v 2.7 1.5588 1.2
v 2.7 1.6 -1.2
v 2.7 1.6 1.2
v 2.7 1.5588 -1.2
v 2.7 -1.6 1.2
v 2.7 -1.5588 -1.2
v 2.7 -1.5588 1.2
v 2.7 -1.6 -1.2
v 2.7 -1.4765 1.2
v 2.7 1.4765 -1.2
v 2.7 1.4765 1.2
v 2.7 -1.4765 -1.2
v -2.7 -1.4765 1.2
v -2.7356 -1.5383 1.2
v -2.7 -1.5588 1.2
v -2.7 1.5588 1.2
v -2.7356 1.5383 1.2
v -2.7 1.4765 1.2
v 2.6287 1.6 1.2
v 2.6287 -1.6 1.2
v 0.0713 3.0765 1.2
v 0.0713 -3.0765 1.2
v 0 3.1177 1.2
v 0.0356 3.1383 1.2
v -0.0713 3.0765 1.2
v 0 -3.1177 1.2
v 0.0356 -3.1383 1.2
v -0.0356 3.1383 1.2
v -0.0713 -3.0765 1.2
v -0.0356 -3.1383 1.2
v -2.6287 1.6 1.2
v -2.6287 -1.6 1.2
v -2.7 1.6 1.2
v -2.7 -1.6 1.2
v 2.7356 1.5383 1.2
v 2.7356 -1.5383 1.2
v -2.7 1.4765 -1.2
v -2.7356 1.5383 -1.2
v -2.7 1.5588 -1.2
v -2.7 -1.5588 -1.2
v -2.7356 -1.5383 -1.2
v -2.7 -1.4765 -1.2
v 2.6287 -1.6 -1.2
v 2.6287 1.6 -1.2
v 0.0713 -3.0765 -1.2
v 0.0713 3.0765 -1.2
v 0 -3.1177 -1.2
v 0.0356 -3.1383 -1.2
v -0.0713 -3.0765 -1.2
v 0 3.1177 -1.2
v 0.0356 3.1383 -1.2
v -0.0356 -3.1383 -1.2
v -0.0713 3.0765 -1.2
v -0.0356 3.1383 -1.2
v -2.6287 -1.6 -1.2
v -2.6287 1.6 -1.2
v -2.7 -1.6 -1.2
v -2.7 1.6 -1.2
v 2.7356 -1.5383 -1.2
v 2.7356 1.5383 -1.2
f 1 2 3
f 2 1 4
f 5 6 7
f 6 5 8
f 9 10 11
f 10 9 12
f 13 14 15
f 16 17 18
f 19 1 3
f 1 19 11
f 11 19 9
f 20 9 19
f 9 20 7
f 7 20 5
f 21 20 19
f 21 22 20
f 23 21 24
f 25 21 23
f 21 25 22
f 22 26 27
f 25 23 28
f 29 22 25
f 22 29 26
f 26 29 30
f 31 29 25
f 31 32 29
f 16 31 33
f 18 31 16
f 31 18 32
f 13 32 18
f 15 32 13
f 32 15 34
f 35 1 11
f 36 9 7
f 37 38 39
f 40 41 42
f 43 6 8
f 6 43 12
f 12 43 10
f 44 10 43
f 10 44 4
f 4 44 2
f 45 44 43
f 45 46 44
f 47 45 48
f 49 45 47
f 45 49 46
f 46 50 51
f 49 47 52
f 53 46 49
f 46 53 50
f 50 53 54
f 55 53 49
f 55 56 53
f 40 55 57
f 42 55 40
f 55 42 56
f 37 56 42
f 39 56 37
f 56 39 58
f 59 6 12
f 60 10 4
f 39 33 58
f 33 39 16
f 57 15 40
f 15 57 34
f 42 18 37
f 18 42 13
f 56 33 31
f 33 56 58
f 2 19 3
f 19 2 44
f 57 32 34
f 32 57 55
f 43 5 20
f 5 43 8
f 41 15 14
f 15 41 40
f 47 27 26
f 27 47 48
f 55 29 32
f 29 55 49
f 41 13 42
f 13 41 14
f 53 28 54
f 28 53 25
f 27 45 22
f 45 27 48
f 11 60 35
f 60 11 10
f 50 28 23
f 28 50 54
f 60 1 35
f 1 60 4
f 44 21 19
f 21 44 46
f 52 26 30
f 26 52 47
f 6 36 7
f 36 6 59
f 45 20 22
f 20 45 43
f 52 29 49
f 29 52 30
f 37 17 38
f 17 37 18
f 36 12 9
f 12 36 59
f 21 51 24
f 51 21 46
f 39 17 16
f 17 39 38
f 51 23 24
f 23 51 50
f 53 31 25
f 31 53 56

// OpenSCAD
// file: variables.scad
innerWidth = 38;
innerLength = 80;
innerHeight = 25;
minEdgeWidth = 2.5;
largeEdgeWidth = 6;
holeRadius = 2;
boxSpacing = 4;
stickRadius = 7.1; // fixed by table

sensorScrewHoleRadius = 2.5/2;

// PCBVariables
	PCBWidth = 35.2;
	PCBBoardLength = 70;
	PCBLength = 80;// 70;
	PCBHeight = 1.5;
	PCBBoardToBoardHeight = 13.9; // height of the two layers of pcb and the pinheaders between them
	
	PCBToBottomSpacing = 3; // space for wires on bottom of PCB
	PCBToTopSpacing = 2; // Air gap between pcb components and stick
	PCBNotchWidth = 1.5; // user definable
	PCBComponentsHeight = 17.1-PCBBoardToBoardHeight; // Height of pCB components on top of top layer pcb

	PCBSensorBoardLength = 15.75;
	PCBSensorBoardWidth = 21;
	PCBSensorBoardOverhang = 7.4; // The length of sensor board that overhangs the main print board
	PCBSensorBoardYOffset = -1.5/2;
	PCBSensorBoardHoleRadius = 1.5;
	PCBSensorBoardHoleCenterYDistance = 12.3+PCBSensorBoardHoleRadius*2;

// BatteryBoxVariables
	batteryRadius = 18.3/2;
	batteryLenght = 65;

// Bolts
	boltHeight = 2.4;
	boltWidth = 5.4;
	boltSegmentWidth = 3.2;

// Switch
	SwitchBaseLength = 9.8;
	SwitchBaseWidth = 13.1;
	SwitchBaseHeight = 8;

	SwitchCylinderRadius = 6/2;
	SwitchCylinderLength = 9;
	SwitchLegLength = 4;

// switch_alt
	SwitchAltWidth = 13;
	SwitchAltHeight = 6;
	SwitchAltDepth = 6;
	SwitchPinLength = 4;
	SwitchAltFlipperHeight = 7;


MaxLength = 85; // fixed by table
MinWidth = max(batteryRadius*4, PCBWidth)+2*largeEdgeWidth;
MinHeight = max(batteryRadius*2, PCBToTopSpacing+PCBComponentsHeight+PCBBoardToBoardHeight+PCBToBottomSpacing)+stickRadius+minEdgeWidth;
// main file
include <variables.scad>

bolt();

module bolt() {
	color("Silver")
	union() {
		for (i = [0:2]) {
			rotate([0, 0, 180/3*i])
			cube([boltWidth, boltSegmentWidth, boltHeight],center=true);
		}
	}
}
